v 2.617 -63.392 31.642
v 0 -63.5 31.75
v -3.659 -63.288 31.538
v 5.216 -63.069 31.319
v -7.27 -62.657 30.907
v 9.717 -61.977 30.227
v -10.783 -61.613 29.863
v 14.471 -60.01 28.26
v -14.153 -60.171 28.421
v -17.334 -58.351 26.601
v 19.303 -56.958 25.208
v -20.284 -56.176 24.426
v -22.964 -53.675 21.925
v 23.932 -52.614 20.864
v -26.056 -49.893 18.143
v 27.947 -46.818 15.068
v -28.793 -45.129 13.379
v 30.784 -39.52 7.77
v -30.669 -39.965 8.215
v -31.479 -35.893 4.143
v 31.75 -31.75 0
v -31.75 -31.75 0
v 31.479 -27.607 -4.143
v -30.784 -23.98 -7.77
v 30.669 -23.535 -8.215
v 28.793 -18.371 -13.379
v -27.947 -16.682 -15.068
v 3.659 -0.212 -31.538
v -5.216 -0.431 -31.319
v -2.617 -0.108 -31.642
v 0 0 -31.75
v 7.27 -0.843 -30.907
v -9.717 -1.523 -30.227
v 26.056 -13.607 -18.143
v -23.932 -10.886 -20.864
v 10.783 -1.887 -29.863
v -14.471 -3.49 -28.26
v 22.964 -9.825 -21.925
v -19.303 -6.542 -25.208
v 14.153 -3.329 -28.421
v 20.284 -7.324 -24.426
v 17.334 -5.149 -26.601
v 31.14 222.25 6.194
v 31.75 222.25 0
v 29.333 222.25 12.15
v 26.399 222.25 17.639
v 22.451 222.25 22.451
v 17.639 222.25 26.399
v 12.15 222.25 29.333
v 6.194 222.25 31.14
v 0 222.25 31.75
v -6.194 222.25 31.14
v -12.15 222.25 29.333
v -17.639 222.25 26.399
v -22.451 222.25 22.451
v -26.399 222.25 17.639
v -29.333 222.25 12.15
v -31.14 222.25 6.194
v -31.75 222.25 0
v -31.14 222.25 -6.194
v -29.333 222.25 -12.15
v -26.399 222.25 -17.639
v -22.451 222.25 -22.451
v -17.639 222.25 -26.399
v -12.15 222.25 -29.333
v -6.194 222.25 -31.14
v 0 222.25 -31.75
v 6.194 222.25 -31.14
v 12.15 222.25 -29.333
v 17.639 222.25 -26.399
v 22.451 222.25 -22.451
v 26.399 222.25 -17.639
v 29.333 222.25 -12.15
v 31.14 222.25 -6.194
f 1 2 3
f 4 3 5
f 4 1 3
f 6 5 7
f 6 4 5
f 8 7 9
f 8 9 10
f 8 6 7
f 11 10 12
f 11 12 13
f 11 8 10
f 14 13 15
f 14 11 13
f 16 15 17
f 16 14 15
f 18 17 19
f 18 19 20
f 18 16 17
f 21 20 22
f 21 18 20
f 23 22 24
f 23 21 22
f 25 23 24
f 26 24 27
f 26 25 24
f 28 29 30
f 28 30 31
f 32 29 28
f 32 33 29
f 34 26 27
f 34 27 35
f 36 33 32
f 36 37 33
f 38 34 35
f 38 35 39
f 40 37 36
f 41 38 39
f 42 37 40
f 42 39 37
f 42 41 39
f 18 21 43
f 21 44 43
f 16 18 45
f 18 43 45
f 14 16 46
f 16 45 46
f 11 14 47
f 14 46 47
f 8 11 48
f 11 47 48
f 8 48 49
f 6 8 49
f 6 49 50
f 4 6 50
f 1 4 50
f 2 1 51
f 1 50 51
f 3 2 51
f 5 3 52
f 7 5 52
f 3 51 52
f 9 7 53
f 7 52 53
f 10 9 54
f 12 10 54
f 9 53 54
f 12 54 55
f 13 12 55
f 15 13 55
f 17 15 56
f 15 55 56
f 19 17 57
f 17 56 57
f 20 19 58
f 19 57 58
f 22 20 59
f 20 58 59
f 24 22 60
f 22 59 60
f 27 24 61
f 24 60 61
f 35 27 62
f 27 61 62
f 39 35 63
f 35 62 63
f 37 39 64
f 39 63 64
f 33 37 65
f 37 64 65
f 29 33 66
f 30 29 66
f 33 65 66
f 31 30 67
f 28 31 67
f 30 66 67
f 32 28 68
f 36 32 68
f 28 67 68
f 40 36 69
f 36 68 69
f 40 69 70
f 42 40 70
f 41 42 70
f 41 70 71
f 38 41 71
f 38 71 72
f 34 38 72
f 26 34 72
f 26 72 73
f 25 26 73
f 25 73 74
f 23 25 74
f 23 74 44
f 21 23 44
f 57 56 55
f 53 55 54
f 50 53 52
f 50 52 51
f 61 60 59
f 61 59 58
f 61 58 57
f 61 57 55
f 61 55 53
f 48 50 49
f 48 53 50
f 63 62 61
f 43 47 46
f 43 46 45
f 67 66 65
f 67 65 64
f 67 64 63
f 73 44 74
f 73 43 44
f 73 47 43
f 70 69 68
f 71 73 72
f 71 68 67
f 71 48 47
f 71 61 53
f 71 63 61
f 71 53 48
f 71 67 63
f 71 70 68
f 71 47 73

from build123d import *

# Parameters (mm, degrees)
SKETCH1_R           = 31.75
BOSS_EXTRUDE1_DEPTH = 222.25
SKETCH2_R           = 31.75
BOSS_EXTRUDE2_DEPTH = 63.5
CUT_EXTRUDE1_DEPTH  = 63.5


with BuildPart() as part:
    # Sketch1 → Boss-Extrude1 (new body)
    with BuildSketch(Plane(origin=(0, 0, 0), x_dir=(1, 0, 0), z_dir=(0, 1, 0))):
        Circle(SKETCH1_R)
    extrude(amount=BOSS_EXTRUDE1_DEPTH)

    # Sketch2 → Boss-Extrude2 (add)
    with BuildSketch(Plane.XZ):
        Circle(SKETCH2_R)
    extrude(amount=BOSS_EXTRUDE2_DEPTH)

    # Sketch3 → Cut-Extrude1 (cut)
    with BuildSketch(Plane(origin=(31.75, 0, 0), x_dir=(0, 0, -1), z_dir=(1, 0, 0))):
        Polygon((31.75, 0), (31.75, -63.5), (-31.75, -63.5), align=None)
    extrude(amount=-CUT_EXTRUDE1_DEPTH, mode=Mode.SUBTRACT)


solid = part.part
